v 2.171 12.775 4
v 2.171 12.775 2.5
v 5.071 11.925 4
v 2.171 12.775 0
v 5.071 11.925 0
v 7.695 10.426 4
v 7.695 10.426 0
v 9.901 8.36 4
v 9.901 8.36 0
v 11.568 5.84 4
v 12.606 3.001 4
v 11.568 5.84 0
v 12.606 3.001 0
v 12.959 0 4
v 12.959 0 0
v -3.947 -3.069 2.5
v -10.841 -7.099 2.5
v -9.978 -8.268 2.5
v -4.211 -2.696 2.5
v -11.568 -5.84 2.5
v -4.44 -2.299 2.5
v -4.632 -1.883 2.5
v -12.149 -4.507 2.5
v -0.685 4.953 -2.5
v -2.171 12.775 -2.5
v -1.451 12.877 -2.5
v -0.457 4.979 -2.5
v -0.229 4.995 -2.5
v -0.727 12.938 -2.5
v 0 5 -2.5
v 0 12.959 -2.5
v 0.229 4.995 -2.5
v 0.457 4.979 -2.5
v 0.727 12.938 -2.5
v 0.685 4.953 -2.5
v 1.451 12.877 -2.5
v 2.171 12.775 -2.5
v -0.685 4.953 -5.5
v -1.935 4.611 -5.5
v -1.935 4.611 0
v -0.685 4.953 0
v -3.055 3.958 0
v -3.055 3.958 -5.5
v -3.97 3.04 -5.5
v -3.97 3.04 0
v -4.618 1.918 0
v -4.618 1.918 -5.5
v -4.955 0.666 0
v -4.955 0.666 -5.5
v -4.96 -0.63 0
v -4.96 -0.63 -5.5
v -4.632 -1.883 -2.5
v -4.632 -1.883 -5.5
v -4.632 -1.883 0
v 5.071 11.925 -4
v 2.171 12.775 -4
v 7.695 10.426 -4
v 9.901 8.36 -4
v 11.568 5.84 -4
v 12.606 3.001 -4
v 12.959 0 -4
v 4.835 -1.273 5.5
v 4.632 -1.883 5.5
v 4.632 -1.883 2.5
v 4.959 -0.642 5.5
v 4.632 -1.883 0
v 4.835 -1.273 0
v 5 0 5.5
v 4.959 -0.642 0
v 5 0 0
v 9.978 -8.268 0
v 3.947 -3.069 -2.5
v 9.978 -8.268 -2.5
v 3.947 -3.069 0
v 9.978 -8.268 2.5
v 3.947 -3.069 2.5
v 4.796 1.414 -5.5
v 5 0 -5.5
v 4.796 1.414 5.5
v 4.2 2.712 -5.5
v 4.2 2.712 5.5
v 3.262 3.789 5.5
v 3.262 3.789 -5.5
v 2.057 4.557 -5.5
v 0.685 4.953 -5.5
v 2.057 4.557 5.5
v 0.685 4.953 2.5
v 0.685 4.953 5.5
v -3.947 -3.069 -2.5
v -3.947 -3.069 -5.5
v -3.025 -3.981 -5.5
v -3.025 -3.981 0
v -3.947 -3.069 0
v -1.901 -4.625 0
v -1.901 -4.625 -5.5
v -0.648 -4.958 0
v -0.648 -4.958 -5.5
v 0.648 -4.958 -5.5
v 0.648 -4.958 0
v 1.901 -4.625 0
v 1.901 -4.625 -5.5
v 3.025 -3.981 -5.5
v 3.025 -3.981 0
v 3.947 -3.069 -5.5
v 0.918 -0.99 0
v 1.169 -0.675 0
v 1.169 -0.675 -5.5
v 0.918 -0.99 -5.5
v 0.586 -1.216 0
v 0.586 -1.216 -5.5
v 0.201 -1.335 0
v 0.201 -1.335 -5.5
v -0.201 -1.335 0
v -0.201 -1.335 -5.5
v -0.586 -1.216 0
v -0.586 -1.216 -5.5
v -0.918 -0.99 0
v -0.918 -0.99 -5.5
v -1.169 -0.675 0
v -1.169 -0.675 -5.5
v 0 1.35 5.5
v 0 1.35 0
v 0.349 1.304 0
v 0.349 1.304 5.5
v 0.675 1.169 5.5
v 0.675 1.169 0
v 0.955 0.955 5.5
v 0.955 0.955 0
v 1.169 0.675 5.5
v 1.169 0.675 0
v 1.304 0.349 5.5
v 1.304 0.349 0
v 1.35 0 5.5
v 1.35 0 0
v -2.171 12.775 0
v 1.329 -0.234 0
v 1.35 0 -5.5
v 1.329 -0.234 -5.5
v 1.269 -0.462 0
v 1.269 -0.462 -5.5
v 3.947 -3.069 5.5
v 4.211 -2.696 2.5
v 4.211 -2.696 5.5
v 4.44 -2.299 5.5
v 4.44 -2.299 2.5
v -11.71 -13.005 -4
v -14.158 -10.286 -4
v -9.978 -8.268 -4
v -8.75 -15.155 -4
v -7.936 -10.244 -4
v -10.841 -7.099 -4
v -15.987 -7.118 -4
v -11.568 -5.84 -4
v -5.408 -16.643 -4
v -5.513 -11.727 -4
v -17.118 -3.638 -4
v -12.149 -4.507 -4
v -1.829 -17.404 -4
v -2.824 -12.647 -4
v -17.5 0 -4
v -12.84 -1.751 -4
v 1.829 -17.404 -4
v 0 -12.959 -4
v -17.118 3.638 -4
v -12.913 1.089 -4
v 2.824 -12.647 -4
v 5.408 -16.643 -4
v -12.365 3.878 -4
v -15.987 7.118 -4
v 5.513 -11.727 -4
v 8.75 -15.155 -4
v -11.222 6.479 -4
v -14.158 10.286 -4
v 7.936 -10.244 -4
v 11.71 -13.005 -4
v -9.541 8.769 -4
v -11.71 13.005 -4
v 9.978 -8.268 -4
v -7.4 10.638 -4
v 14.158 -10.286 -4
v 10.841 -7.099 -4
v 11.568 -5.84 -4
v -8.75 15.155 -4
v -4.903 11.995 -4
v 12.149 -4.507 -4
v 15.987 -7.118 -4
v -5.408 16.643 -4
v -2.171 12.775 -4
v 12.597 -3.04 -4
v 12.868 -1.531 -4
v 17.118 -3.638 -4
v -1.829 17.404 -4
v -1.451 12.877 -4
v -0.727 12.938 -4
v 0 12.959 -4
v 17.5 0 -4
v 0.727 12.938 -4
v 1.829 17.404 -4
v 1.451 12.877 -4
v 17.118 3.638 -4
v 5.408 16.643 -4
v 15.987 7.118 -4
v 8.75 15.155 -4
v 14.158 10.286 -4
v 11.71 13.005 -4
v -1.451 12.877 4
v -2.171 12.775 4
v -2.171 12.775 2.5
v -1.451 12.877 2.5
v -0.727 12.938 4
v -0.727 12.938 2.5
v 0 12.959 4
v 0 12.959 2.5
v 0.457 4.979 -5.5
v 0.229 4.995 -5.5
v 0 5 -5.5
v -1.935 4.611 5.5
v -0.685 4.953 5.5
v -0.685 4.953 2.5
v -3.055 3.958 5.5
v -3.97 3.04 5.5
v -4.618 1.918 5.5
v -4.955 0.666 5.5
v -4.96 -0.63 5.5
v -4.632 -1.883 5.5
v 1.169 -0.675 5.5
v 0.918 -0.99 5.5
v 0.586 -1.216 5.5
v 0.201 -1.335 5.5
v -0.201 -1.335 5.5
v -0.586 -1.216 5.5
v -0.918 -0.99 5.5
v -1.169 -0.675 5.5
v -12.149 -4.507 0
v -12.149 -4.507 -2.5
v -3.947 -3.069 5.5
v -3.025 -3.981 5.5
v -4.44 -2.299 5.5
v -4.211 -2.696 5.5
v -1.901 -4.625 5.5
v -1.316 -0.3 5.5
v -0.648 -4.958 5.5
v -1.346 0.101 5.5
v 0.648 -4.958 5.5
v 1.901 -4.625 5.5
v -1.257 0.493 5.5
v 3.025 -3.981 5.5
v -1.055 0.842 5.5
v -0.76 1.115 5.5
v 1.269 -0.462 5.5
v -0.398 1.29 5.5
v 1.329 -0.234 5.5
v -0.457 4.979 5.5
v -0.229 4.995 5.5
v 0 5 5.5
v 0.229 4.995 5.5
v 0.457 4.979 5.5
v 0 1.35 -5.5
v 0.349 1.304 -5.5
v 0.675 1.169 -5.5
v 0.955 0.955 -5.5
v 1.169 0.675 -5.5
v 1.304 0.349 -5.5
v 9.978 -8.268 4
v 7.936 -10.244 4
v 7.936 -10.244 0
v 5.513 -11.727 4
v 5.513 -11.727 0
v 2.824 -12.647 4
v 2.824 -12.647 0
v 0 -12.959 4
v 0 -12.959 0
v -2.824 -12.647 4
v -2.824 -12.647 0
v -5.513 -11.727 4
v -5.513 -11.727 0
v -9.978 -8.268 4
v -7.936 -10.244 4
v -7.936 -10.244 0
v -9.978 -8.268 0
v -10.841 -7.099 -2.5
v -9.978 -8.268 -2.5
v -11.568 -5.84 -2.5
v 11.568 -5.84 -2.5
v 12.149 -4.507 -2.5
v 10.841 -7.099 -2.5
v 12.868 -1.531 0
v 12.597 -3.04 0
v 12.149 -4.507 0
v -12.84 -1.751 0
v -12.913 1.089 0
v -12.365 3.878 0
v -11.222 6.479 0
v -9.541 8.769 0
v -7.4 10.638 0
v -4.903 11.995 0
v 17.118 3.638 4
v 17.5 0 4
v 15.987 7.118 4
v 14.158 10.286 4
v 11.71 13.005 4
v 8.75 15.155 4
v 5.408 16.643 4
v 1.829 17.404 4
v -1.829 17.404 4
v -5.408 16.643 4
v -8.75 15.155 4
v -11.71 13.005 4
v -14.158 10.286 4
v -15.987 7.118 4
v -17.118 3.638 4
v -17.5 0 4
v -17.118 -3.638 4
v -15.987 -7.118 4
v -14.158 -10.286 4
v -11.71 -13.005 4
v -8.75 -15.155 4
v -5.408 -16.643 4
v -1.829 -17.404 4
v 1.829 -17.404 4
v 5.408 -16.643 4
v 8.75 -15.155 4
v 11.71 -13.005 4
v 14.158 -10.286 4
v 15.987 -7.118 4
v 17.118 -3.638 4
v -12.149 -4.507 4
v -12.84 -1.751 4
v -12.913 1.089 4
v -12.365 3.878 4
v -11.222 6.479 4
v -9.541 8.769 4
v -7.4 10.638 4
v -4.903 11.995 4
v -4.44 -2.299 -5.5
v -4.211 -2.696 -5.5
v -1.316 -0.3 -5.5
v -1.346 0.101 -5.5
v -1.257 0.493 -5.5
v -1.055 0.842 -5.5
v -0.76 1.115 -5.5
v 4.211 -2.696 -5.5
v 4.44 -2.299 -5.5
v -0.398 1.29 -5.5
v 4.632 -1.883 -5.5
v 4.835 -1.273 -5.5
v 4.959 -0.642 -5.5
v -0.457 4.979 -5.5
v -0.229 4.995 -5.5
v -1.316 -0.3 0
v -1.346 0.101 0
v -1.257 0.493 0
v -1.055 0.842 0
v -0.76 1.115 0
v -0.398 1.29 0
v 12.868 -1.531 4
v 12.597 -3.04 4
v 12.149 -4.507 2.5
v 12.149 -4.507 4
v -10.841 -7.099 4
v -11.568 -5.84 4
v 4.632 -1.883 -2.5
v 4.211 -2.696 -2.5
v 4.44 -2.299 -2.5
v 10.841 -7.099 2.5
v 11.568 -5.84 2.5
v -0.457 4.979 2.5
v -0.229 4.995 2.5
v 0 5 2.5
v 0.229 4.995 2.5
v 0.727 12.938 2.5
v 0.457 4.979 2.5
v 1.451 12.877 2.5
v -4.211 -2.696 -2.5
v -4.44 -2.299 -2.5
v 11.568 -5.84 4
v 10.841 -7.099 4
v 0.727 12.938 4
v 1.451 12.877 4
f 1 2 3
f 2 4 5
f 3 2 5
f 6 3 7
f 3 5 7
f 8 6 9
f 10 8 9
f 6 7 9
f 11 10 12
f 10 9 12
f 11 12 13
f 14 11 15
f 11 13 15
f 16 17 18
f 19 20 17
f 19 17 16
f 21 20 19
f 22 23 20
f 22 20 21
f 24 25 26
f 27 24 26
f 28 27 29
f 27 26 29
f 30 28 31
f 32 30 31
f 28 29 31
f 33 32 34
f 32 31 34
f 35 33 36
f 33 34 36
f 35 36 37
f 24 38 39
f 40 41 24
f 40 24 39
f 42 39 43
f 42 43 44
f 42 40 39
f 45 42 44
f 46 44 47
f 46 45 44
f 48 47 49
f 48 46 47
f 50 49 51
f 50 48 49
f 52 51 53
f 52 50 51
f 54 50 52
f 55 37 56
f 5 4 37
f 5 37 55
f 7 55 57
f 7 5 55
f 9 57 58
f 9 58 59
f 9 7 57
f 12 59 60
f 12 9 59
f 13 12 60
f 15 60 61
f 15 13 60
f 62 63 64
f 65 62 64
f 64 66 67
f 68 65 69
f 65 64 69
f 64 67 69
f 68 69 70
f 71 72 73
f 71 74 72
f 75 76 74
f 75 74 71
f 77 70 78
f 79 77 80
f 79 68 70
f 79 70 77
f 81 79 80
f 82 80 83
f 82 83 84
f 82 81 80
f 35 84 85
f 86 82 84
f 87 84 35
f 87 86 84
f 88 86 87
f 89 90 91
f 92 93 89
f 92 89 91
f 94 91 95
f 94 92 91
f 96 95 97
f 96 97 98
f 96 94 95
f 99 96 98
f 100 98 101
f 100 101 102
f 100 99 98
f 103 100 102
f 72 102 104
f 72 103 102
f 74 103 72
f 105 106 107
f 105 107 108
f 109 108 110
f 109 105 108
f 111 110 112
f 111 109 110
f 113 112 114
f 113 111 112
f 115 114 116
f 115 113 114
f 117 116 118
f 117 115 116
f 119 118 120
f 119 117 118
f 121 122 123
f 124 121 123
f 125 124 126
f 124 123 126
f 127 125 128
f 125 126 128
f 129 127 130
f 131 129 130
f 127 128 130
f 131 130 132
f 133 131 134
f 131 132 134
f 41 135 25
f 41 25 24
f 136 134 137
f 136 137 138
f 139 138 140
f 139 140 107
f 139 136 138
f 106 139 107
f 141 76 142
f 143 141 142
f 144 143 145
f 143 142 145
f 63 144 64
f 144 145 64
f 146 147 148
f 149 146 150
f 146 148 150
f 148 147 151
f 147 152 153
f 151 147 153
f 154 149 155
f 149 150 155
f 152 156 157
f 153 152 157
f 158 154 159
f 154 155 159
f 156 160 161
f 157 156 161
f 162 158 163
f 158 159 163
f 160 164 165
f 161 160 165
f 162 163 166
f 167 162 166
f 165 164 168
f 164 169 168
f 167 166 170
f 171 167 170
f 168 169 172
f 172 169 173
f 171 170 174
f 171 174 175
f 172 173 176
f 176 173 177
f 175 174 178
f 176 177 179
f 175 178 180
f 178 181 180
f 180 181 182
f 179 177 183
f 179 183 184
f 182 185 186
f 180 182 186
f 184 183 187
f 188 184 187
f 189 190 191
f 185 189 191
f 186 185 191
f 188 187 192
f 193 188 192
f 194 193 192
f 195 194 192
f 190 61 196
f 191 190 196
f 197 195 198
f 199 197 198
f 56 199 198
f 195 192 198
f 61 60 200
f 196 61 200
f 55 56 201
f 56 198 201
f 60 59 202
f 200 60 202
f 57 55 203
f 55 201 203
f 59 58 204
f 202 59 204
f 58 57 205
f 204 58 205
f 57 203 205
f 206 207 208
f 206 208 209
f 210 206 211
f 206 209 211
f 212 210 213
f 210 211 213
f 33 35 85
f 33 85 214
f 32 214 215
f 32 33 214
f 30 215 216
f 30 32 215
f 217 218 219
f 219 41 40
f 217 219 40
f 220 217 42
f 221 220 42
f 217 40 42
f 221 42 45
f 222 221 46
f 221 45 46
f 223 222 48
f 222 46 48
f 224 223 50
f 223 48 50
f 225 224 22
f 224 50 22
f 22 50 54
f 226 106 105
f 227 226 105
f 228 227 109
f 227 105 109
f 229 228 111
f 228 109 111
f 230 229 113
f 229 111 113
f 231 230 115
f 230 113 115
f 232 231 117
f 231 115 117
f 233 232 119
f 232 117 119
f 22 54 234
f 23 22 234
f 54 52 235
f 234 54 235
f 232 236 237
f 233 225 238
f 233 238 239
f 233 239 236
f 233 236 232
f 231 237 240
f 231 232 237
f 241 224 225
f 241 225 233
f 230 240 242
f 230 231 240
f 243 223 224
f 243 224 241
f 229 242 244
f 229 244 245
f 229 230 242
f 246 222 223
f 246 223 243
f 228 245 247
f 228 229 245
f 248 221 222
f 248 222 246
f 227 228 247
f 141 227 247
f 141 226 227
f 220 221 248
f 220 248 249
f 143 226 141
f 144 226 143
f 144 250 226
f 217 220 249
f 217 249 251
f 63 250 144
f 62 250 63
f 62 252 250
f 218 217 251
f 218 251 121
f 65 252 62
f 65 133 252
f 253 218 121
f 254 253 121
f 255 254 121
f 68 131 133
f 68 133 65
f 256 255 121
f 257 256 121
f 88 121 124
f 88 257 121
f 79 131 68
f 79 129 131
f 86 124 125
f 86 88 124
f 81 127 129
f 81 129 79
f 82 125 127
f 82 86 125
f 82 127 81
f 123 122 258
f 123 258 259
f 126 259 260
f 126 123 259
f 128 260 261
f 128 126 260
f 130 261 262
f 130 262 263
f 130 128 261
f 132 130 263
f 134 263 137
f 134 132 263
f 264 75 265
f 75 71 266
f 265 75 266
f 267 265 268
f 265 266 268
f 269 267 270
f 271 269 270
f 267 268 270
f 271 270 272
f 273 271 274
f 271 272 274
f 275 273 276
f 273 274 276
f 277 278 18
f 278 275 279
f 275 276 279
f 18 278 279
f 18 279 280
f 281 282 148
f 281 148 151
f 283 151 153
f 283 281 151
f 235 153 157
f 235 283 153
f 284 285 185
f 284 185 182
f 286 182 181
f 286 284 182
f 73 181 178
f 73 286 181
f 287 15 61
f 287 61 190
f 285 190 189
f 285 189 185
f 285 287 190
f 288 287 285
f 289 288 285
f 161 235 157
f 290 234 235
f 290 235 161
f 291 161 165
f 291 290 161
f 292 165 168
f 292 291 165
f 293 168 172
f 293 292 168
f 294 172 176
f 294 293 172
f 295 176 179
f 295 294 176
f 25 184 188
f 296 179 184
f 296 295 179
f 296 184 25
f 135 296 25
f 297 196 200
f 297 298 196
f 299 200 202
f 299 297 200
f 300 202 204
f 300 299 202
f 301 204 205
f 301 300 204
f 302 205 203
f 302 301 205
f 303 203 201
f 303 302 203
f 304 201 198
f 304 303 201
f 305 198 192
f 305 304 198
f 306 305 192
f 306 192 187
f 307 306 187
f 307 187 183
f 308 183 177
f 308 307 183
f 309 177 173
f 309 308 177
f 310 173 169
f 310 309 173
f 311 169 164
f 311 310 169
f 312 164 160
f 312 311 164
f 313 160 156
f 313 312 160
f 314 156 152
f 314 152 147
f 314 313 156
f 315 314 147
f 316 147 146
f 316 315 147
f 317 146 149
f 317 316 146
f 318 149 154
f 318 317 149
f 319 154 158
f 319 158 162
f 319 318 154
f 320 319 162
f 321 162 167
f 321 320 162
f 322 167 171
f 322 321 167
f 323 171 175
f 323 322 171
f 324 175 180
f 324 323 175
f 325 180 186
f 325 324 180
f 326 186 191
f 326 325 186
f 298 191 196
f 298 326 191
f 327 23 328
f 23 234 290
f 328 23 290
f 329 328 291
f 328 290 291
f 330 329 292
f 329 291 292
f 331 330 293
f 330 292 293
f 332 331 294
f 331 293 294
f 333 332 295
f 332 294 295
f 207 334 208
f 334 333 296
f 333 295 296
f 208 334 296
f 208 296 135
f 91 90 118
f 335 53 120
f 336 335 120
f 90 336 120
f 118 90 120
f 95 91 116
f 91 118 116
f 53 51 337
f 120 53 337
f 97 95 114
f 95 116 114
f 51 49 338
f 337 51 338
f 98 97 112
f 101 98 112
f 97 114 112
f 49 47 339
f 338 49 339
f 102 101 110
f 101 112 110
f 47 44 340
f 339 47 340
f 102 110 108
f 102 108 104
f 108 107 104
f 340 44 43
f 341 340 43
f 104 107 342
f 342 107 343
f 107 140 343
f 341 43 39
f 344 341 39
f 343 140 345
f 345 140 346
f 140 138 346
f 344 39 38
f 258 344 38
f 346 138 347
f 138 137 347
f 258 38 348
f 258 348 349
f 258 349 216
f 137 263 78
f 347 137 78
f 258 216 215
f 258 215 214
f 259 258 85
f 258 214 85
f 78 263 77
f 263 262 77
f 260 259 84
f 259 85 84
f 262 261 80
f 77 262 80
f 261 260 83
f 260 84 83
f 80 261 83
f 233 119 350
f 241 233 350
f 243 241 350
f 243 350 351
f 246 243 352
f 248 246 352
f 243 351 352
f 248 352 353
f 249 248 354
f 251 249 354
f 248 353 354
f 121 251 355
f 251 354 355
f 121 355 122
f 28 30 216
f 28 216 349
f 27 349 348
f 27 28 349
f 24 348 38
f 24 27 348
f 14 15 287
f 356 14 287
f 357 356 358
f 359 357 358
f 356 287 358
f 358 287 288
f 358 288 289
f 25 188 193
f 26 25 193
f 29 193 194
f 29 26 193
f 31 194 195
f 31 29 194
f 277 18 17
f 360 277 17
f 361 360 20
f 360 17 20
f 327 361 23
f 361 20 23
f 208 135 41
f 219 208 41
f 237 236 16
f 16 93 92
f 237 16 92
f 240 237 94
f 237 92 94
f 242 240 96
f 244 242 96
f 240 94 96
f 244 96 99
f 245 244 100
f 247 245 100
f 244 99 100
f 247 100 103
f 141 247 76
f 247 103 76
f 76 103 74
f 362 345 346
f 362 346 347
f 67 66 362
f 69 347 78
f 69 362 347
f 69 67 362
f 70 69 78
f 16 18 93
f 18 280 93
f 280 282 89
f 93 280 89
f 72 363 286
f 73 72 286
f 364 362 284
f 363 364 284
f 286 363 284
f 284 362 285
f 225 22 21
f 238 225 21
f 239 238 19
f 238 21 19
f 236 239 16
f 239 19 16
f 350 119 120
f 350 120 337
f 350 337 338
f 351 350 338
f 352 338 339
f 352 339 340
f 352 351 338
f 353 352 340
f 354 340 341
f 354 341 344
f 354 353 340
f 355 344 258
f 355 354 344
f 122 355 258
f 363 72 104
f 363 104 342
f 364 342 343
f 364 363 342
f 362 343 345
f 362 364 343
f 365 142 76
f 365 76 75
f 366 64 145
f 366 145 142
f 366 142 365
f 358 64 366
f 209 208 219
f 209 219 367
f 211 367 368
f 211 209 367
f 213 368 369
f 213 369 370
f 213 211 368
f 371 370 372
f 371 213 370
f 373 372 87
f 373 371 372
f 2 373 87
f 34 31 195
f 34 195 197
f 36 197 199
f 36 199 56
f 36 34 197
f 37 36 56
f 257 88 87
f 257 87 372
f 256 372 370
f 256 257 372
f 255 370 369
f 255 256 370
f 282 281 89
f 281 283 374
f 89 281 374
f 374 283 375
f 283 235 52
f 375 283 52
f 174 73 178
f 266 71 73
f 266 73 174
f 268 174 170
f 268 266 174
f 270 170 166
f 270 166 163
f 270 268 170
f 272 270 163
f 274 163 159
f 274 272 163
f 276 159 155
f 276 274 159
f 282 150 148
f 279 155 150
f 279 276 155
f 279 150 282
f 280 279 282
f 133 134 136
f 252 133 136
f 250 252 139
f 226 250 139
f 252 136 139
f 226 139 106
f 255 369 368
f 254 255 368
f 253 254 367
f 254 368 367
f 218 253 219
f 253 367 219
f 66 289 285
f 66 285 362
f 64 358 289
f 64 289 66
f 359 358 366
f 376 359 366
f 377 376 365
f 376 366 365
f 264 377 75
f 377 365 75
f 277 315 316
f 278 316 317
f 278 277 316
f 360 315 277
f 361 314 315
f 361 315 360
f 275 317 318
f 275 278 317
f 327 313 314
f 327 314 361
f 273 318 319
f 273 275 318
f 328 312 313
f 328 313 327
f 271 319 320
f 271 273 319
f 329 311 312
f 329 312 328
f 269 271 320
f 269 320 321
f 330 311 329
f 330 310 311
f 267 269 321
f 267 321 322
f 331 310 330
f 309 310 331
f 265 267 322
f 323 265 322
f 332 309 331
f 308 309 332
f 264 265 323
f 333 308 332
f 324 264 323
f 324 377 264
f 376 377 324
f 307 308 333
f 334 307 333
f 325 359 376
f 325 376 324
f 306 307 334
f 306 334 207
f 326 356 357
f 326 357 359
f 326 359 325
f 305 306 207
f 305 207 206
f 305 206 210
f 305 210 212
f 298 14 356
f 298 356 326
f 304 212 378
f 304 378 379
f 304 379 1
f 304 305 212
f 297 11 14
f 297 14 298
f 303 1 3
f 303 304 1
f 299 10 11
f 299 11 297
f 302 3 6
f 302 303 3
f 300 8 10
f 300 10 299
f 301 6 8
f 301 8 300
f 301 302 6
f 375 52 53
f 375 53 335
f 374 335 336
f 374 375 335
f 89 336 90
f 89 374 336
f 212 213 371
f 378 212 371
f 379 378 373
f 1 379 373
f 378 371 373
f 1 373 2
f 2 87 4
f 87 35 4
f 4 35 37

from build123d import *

# Parameters (mm, degrees)
F1_DEPTH = 5.5
F2_DEPTH = 2.5
F0_R     = 17.5
F3_DEPTH = 4


with BuildPart() as f1:
    # F0 (on Top) → F1 (new body, symmetric)
    with BuildSketch(Plane.XY):
        with BuildLine():
            ThreePointArc((-1.1691342951, -0.675), (-1.1691342951, 0.675), (0, 1.35))
            Line((0, 1.35), (-0.6846800298, 4.9528994798))
            ThreePointArc((-0.6846800298, 4.9528994798), (-4.3301270189, 2.5), (-4.6316767868, -1.8834994406))
            Line((-4.6316767868, -1.8834994406), (-1.1691342951, -0.675))
        make_face()
        with BuildLine():
            Line((-3.946996757, -3.0694000392), (-1.1691342951, -0.675))
            Line((-1.1691342951, -0.675), (-4.6316767868, -1.8834994406))
            ThreePointArc((-4.6316767868, -1.8834994406), (-4.3301270189, -2.5), (-3.946996757, -3.0694000392))
        make_face()
        with BuildLine():
            ThreePointArc((-3.946996757, -3.0694000392), (0, -5), (3.946996757, -3.0694000392))
            Line((3.946996757, -3.0694000392), (1.1691342951, -0.675))
            ThreePointArc((1.1691342951, -0.675), (0, -1.35), (-1.1691342951, -0.675))
            Line((-1.1691342951, -0.675), (-3.946996757, -3.0694000392))
        make_face()
        with BuildLine():
            ThreePointArc((5, 0), (3.7698408553, 3.284554753), (0.6846800298, 4.9528994798))
            Line((0.6846800298, 4.9528994798), (0, 1.35))
            ThreePointArc((0, 1.35), (0.9545941546, 0.9545941546), (1.35, 0))
            ThreePointArc((1.35, 0), (1.3039998655, -0.3494057109), (1.1691342951, -0.675))
            Line((1.1691342951, -0.675), (4.6316767868, -1.8834994406))
            ThreePointArc((4.6316767868, -1.8834994406), (4.9070553254, -0.9595874286), (5, 0))
        make_face()
        with BuildLine():
            ThreePointArc((3.946996757, -3.0694000392), (4.3301270189, -2.5), (4.6316767868, -1.8834994406))
            Line((4.6316767868, -1.8834994406), (1.1691342951, -0.675))
            Line((1.1691342951, -0.675), (3.946996757, -3.0694000392))
        make_face()
        with BuildLine():
            Line((0, 1.35), (0.6846800298, 4.9528994798))
            ThreePointArc((0.6846800298, 4.9528994798), (0.3431490938, 4.9882109718), (0, 5))
            Line((0, 5), (0, 1.35))
        make_face()
        with BuildLine():
            Line((0, 1.35), (0, 5))
            ThreePointArc((0, 5), (-0.3431490938, 4.9882109718), (-0.6846800298, 4.9528994798))
            Line((-0.6846800298, 4.9528994798), (0, 1.35))
        make_face()
    extrude(amount=F1_DEPTH, both=True)

    # F0 (on Top) → F2 (join, symmetric)
    with BuildSketch(Plane.XY):
        with BuildLine():
            Line((0.6846800298, 4.9528994798), (2.1712380216, 12.775413329))
            ThreePointArc((2.1712380216, 12.775413329), (1.089476247, 12.9127263497), (0, 12.9586056455))
            Line((0, 12.9586056455), (0, 5))
            ThreePointArc((0, 5), (0.3431490938, 4.9882109718), (0.6846800298, 4.9528994798))
        make_face()
        with BuildLine():
            Line((0, 5), (0, 12.9586056455))
            ThreePointArc((0, 12.9586056455), (-1.089476247, 12.9127263497), (-2.1712380216, 12.775413329))
            Line((-2.1712380216, 12.775413329), (-0.6846800298, 4.9528994798))
            ThreePointArc((-0.6846800298, 4.9528994798), (-0.3431490938, 4.9882109718), (0, 5))
        make_face()
        with BuildLine():
            ThreePointArc((-12.1494514976, -4.5073593802), (-11.2224816866, -6.4793028227), (-9.978213476, -8.2680539489))
            Line((-9.978213476, -8.2680539489), (-3.946996757, -3.0694000392))
            ThreePointArc((-3.946996757, -3.0694000392), (-4.3301270189, -2.5), (-4.6316767868, -1.8834994406))
            Line((-4.6316767868, -1.8834994406), (-12.1494514976, -4.5073593802))
        make_face()
        with BuildLine():
            ThreePointArc((9.978213476, -8.2680539489), (11.2224816866, -6.4793028227), (12.1494514976, -4.5073593802))
            Line((12.1494514976, -4.5073593802), (4.6316767868, -1.8834994406))
            ThreePointArc((4.6316767868, -1.8834994406), (4.3301270189, -2.5), (3.946996757, -3.0694000392))
            Line((3.946996757, -3.0694000392), (9.978213476, -8.2680539489))
        make_face()
    extrude(amount=F2_DEPTH, both=True)

    # F0 (on Top) → F3 (join, symmetric)
    with BuildSketch(Plane.XY):
        Circle(F0_R)
        with BuildLine():
            ThreePointArc((2.1712380216, 12.775413329), (9.9010524077, 8.3603003233), (12.9586056455, 0))
            ThreePointArc((12.9586056455, 0), (12.7547130709, -2.2897062594), (12.1494514976, -4.5073593802))
            ThreePointArc((12.1494514976, -4.5073593802), (11.2224816866, -6.4793028227), (9.978213476, -8.2680539489))
            ThreePointArc((9.978213476, -8.2680539489), (0, -12.9586056455), (-9.978213476, -8.2680539489))
            ThreePointArc((-9.978213476, -8.2680539489), (-11.2224816866, -6.4793028227), (-12.1494514976, -4.5073593802))
            ThreePointArc((-12.1494514976, -4.5073593802), (-11.2224816866, 6.4793028227), (-2.1712380216, 12.775413329))
            ThreePointArc((-2.1712380216, 12.775413329), (-1.089476247, 12.9127263497), (0, 12.9586056455))
            ThreePointArc((0, 12.9586056455), (1.089476247, 12.9127263497), (2.1712380216, 12.775413329))
        make_face(mode=Mode.SUBTRACT)
    extrude(amount=F3_DEPTH, both=True)


solid = f1.part
